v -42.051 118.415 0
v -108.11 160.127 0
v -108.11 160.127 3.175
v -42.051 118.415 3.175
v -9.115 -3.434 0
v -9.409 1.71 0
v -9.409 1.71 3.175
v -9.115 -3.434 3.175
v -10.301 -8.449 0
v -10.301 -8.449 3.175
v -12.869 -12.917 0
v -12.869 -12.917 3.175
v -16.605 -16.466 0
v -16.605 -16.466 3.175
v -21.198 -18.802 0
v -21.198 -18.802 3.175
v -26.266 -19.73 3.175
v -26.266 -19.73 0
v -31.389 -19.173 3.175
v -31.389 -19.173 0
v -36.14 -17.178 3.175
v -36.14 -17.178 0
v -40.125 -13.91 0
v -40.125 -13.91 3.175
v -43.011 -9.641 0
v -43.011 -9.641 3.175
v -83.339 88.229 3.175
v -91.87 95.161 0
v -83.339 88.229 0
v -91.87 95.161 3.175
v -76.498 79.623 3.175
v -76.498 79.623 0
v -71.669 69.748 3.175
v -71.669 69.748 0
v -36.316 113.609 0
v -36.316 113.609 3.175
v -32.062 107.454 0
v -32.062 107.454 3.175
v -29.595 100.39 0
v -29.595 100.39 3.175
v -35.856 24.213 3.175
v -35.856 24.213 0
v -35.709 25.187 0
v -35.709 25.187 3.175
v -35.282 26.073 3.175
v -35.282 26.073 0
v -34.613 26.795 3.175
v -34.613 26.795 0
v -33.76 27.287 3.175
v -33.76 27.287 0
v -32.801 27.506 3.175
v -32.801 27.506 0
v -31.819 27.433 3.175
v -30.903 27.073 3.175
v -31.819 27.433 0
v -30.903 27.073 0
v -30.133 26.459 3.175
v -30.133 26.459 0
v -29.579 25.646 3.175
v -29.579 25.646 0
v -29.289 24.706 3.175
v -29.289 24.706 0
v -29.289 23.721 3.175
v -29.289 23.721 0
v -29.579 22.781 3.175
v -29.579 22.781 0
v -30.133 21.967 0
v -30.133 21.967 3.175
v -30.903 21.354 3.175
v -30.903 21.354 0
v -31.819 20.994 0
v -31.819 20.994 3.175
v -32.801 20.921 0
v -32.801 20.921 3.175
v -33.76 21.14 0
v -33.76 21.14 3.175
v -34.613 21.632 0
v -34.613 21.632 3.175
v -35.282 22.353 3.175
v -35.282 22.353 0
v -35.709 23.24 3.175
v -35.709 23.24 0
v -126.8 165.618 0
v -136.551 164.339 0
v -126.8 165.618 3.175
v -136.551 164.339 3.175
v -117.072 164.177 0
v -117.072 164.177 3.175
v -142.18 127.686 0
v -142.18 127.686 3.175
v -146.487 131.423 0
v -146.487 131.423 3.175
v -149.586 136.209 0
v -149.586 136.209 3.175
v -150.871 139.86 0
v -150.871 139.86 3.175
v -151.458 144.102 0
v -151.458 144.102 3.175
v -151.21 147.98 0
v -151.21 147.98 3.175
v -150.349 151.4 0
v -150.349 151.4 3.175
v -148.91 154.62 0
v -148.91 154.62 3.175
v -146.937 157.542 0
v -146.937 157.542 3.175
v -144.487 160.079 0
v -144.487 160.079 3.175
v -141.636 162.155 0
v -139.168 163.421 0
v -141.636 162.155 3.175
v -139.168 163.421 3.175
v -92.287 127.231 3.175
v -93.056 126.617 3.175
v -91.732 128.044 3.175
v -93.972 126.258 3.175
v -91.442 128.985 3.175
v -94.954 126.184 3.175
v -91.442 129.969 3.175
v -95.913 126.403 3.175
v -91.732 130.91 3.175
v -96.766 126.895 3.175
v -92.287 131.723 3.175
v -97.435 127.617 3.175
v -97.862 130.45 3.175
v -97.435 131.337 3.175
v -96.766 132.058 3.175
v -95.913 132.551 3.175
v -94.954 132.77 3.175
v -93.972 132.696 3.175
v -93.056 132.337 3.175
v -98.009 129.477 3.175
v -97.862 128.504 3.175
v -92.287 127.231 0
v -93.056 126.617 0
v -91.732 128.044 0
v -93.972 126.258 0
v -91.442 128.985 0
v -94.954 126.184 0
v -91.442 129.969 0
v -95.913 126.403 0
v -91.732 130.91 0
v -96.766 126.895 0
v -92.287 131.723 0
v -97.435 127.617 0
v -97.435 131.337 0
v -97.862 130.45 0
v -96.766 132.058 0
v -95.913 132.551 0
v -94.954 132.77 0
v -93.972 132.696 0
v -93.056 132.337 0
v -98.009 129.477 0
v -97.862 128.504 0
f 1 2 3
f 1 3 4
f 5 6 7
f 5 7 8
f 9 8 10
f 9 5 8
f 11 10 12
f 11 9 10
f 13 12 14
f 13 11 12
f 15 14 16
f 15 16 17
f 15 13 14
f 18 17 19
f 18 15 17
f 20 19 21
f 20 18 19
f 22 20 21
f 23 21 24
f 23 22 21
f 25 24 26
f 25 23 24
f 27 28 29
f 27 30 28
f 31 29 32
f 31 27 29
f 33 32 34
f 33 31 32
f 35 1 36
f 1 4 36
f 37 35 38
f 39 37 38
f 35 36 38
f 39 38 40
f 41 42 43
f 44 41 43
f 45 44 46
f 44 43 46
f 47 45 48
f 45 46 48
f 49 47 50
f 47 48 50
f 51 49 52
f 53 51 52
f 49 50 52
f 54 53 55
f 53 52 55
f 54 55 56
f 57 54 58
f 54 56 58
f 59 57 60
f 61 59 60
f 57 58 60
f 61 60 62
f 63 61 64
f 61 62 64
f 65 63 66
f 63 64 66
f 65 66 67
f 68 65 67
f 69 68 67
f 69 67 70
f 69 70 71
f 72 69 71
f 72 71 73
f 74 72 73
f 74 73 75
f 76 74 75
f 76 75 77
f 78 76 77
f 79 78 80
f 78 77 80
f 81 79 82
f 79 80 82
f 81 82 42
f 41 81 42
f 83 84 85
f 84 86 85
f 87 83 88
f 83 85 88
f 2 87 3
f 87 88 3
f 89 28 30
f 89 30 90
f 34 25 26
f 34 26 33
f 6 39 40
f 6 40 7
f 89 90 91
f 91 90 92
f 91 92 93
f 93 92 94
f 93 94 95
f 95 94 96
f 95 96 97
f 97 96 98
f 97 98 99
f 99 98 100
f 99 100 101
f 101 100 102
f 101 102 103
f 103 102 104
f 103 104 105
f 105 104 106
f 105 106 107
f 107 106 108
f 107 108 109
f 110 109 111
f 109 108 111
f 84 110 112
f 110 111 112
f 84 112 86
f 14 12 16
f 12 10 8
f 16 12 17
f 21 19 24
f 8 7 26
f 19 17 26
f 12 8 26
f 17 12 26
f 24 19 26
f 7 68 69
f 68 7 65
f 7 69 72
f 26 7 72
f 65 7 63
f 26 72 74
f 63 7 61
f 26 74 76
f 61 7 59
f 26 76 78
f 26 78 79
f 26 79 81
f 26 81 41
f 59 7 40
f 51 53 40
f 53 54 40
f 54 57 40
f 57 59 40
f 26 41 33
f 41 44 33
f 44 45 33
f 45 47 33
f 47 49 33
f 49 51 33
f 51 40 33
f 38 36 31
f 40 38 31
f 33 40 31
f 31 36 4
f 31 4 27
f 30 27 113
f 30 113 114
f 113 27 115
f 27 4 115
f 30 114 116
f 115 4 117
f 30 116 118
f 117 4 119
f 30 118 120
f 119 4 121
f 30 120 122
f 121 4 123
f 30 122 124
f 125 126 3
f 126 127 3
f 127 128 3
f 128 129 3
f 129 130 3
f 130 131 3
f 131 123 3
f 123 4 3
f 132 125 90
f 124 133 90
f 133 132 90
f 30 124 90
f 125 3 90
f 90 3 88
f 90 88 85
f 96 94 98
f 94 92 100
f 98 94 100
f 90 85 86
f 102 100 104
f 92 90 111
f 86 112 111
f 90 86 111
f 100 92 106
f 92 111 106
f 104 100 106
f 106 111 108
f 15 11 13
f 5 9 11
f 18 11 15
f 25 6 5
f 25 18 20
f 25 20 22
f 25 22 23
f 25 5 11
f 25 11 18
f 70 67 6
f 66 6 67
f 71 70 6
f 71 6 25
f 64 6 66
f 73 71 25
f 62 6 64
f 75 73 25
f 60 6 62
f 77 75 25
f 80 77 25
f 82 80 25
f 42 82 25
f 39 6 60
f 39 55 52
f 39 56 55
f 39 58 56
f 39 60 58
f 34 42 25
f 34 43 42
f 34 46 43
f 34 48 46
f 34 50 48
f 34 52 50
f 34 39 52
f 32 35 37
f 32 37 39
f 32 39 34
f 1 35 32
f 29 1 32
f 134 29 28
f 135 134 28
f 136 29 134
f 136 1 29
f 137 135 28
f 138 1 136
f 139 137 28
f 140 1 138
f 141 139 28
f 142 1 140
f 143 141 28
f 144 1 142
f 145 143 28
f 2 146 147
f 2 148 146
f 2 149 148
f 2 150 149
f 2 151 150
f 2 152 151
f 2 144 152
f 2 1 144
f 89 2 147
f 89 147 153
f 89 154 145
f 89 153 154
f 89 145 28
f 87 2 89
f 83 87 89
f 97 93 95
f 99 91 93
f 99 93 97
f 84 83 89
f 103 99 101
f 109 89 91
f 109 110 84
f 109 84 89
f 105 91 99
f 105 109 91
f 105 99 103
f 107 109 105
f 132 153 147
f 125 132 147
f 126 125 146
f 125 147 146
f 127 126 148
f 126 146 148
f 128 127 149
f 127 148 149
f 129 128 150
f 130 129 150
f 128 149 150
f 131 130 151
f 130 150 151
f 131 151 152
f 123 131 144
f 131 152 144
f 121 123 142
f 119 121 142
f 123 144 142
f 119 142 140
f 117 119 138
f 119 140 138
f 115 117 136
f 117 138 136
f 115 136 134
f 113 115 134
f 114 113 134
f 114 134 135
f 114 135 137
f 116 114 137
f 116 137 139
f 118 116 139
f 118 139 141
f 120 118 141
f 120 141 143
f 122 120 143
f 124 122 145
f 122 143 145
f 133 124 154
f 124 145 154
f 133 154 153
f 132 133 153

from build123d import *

# Parameters (mm, degrees)
SKETCH1_R           = 3.302
BOSS_EXTRUDE1_DEPTH = 3.175
FILLET6_R           = 35.56
FILLET10_R          = 27.94
FILLET13_R          = 50.8
FILLET16_R          = 20.32


with BuildPart() as part:
    # Sketch1 → Boss-Extrude1 (new body)
    with BuildSketch(Plane(origin=(0, 0, 0), x_dir=(-1, 0, 0), z_dir=(0, 0, -1))):
        with BuildLine():
            Line((165.785053206, 142.946766421), (130.990896358, 174.574150067))
            Line((130.990896358, 174.574150067), (31.981087973, 112.057039535))
            Line((31.981087973, 112.057039535), (9.409224511, 1.710371233))
            ThreePointArc((9.409224511, 1.710371233), (21.197749586, -18.801775256), (43.01064713, -9.641263383))
            Line((43.01064713, -9.641263383), (77.484953862, 85.860414024))
            Line((77.484953862, 85.860414024), (165.785053206, 142.946766421))
        make_face()
        with Locations((32.554001794, 24.213373462)):
            Circle(SKETCH1_R, mode=Mode.SUBTRACT)
        with Locations((94.707078764, 129.476886965)):
            Circle(SKETCH1_R, mode=Mode.SUBTRACT)
    extrude(amount=-BOSS_EXTRUDE1_DEPTH)

    # Fillet6
    fillet6_edges = [part.edges().sort_by_distance(p)[0] for p in [
        (-130.990896358, 174.574150067, 1.5875),
    ]]
    fillet(fillet6_edges, radius=FILLET6_R)

    # Fillet10
    fillet10_edges = [part.edges().sort_by_distance(p)[0] for p in [
        (-31.981087973, 112.057039535, 1.5875),
    ]]
    fillet(fillet10_edges, radius=FILLET10_R)

    # Fillet13
    fillet13_edges = [part.edges().sort_by_distance(p)[0] for p in [
        (-77.484953862, 85.860414024, 1.5875),
    ]]
    fillet(fillet13_edges, radius=FILLET13_R)

    # Fillet16
    fillet16_edges = [part.edges().sort_by_distance(p)[0] for p in [
        (-165.785053206, 142.946766421, 1.5875),
    ]]
    fillet(fillet16_edges, radius=FILLET16_R)


solid = part.part
